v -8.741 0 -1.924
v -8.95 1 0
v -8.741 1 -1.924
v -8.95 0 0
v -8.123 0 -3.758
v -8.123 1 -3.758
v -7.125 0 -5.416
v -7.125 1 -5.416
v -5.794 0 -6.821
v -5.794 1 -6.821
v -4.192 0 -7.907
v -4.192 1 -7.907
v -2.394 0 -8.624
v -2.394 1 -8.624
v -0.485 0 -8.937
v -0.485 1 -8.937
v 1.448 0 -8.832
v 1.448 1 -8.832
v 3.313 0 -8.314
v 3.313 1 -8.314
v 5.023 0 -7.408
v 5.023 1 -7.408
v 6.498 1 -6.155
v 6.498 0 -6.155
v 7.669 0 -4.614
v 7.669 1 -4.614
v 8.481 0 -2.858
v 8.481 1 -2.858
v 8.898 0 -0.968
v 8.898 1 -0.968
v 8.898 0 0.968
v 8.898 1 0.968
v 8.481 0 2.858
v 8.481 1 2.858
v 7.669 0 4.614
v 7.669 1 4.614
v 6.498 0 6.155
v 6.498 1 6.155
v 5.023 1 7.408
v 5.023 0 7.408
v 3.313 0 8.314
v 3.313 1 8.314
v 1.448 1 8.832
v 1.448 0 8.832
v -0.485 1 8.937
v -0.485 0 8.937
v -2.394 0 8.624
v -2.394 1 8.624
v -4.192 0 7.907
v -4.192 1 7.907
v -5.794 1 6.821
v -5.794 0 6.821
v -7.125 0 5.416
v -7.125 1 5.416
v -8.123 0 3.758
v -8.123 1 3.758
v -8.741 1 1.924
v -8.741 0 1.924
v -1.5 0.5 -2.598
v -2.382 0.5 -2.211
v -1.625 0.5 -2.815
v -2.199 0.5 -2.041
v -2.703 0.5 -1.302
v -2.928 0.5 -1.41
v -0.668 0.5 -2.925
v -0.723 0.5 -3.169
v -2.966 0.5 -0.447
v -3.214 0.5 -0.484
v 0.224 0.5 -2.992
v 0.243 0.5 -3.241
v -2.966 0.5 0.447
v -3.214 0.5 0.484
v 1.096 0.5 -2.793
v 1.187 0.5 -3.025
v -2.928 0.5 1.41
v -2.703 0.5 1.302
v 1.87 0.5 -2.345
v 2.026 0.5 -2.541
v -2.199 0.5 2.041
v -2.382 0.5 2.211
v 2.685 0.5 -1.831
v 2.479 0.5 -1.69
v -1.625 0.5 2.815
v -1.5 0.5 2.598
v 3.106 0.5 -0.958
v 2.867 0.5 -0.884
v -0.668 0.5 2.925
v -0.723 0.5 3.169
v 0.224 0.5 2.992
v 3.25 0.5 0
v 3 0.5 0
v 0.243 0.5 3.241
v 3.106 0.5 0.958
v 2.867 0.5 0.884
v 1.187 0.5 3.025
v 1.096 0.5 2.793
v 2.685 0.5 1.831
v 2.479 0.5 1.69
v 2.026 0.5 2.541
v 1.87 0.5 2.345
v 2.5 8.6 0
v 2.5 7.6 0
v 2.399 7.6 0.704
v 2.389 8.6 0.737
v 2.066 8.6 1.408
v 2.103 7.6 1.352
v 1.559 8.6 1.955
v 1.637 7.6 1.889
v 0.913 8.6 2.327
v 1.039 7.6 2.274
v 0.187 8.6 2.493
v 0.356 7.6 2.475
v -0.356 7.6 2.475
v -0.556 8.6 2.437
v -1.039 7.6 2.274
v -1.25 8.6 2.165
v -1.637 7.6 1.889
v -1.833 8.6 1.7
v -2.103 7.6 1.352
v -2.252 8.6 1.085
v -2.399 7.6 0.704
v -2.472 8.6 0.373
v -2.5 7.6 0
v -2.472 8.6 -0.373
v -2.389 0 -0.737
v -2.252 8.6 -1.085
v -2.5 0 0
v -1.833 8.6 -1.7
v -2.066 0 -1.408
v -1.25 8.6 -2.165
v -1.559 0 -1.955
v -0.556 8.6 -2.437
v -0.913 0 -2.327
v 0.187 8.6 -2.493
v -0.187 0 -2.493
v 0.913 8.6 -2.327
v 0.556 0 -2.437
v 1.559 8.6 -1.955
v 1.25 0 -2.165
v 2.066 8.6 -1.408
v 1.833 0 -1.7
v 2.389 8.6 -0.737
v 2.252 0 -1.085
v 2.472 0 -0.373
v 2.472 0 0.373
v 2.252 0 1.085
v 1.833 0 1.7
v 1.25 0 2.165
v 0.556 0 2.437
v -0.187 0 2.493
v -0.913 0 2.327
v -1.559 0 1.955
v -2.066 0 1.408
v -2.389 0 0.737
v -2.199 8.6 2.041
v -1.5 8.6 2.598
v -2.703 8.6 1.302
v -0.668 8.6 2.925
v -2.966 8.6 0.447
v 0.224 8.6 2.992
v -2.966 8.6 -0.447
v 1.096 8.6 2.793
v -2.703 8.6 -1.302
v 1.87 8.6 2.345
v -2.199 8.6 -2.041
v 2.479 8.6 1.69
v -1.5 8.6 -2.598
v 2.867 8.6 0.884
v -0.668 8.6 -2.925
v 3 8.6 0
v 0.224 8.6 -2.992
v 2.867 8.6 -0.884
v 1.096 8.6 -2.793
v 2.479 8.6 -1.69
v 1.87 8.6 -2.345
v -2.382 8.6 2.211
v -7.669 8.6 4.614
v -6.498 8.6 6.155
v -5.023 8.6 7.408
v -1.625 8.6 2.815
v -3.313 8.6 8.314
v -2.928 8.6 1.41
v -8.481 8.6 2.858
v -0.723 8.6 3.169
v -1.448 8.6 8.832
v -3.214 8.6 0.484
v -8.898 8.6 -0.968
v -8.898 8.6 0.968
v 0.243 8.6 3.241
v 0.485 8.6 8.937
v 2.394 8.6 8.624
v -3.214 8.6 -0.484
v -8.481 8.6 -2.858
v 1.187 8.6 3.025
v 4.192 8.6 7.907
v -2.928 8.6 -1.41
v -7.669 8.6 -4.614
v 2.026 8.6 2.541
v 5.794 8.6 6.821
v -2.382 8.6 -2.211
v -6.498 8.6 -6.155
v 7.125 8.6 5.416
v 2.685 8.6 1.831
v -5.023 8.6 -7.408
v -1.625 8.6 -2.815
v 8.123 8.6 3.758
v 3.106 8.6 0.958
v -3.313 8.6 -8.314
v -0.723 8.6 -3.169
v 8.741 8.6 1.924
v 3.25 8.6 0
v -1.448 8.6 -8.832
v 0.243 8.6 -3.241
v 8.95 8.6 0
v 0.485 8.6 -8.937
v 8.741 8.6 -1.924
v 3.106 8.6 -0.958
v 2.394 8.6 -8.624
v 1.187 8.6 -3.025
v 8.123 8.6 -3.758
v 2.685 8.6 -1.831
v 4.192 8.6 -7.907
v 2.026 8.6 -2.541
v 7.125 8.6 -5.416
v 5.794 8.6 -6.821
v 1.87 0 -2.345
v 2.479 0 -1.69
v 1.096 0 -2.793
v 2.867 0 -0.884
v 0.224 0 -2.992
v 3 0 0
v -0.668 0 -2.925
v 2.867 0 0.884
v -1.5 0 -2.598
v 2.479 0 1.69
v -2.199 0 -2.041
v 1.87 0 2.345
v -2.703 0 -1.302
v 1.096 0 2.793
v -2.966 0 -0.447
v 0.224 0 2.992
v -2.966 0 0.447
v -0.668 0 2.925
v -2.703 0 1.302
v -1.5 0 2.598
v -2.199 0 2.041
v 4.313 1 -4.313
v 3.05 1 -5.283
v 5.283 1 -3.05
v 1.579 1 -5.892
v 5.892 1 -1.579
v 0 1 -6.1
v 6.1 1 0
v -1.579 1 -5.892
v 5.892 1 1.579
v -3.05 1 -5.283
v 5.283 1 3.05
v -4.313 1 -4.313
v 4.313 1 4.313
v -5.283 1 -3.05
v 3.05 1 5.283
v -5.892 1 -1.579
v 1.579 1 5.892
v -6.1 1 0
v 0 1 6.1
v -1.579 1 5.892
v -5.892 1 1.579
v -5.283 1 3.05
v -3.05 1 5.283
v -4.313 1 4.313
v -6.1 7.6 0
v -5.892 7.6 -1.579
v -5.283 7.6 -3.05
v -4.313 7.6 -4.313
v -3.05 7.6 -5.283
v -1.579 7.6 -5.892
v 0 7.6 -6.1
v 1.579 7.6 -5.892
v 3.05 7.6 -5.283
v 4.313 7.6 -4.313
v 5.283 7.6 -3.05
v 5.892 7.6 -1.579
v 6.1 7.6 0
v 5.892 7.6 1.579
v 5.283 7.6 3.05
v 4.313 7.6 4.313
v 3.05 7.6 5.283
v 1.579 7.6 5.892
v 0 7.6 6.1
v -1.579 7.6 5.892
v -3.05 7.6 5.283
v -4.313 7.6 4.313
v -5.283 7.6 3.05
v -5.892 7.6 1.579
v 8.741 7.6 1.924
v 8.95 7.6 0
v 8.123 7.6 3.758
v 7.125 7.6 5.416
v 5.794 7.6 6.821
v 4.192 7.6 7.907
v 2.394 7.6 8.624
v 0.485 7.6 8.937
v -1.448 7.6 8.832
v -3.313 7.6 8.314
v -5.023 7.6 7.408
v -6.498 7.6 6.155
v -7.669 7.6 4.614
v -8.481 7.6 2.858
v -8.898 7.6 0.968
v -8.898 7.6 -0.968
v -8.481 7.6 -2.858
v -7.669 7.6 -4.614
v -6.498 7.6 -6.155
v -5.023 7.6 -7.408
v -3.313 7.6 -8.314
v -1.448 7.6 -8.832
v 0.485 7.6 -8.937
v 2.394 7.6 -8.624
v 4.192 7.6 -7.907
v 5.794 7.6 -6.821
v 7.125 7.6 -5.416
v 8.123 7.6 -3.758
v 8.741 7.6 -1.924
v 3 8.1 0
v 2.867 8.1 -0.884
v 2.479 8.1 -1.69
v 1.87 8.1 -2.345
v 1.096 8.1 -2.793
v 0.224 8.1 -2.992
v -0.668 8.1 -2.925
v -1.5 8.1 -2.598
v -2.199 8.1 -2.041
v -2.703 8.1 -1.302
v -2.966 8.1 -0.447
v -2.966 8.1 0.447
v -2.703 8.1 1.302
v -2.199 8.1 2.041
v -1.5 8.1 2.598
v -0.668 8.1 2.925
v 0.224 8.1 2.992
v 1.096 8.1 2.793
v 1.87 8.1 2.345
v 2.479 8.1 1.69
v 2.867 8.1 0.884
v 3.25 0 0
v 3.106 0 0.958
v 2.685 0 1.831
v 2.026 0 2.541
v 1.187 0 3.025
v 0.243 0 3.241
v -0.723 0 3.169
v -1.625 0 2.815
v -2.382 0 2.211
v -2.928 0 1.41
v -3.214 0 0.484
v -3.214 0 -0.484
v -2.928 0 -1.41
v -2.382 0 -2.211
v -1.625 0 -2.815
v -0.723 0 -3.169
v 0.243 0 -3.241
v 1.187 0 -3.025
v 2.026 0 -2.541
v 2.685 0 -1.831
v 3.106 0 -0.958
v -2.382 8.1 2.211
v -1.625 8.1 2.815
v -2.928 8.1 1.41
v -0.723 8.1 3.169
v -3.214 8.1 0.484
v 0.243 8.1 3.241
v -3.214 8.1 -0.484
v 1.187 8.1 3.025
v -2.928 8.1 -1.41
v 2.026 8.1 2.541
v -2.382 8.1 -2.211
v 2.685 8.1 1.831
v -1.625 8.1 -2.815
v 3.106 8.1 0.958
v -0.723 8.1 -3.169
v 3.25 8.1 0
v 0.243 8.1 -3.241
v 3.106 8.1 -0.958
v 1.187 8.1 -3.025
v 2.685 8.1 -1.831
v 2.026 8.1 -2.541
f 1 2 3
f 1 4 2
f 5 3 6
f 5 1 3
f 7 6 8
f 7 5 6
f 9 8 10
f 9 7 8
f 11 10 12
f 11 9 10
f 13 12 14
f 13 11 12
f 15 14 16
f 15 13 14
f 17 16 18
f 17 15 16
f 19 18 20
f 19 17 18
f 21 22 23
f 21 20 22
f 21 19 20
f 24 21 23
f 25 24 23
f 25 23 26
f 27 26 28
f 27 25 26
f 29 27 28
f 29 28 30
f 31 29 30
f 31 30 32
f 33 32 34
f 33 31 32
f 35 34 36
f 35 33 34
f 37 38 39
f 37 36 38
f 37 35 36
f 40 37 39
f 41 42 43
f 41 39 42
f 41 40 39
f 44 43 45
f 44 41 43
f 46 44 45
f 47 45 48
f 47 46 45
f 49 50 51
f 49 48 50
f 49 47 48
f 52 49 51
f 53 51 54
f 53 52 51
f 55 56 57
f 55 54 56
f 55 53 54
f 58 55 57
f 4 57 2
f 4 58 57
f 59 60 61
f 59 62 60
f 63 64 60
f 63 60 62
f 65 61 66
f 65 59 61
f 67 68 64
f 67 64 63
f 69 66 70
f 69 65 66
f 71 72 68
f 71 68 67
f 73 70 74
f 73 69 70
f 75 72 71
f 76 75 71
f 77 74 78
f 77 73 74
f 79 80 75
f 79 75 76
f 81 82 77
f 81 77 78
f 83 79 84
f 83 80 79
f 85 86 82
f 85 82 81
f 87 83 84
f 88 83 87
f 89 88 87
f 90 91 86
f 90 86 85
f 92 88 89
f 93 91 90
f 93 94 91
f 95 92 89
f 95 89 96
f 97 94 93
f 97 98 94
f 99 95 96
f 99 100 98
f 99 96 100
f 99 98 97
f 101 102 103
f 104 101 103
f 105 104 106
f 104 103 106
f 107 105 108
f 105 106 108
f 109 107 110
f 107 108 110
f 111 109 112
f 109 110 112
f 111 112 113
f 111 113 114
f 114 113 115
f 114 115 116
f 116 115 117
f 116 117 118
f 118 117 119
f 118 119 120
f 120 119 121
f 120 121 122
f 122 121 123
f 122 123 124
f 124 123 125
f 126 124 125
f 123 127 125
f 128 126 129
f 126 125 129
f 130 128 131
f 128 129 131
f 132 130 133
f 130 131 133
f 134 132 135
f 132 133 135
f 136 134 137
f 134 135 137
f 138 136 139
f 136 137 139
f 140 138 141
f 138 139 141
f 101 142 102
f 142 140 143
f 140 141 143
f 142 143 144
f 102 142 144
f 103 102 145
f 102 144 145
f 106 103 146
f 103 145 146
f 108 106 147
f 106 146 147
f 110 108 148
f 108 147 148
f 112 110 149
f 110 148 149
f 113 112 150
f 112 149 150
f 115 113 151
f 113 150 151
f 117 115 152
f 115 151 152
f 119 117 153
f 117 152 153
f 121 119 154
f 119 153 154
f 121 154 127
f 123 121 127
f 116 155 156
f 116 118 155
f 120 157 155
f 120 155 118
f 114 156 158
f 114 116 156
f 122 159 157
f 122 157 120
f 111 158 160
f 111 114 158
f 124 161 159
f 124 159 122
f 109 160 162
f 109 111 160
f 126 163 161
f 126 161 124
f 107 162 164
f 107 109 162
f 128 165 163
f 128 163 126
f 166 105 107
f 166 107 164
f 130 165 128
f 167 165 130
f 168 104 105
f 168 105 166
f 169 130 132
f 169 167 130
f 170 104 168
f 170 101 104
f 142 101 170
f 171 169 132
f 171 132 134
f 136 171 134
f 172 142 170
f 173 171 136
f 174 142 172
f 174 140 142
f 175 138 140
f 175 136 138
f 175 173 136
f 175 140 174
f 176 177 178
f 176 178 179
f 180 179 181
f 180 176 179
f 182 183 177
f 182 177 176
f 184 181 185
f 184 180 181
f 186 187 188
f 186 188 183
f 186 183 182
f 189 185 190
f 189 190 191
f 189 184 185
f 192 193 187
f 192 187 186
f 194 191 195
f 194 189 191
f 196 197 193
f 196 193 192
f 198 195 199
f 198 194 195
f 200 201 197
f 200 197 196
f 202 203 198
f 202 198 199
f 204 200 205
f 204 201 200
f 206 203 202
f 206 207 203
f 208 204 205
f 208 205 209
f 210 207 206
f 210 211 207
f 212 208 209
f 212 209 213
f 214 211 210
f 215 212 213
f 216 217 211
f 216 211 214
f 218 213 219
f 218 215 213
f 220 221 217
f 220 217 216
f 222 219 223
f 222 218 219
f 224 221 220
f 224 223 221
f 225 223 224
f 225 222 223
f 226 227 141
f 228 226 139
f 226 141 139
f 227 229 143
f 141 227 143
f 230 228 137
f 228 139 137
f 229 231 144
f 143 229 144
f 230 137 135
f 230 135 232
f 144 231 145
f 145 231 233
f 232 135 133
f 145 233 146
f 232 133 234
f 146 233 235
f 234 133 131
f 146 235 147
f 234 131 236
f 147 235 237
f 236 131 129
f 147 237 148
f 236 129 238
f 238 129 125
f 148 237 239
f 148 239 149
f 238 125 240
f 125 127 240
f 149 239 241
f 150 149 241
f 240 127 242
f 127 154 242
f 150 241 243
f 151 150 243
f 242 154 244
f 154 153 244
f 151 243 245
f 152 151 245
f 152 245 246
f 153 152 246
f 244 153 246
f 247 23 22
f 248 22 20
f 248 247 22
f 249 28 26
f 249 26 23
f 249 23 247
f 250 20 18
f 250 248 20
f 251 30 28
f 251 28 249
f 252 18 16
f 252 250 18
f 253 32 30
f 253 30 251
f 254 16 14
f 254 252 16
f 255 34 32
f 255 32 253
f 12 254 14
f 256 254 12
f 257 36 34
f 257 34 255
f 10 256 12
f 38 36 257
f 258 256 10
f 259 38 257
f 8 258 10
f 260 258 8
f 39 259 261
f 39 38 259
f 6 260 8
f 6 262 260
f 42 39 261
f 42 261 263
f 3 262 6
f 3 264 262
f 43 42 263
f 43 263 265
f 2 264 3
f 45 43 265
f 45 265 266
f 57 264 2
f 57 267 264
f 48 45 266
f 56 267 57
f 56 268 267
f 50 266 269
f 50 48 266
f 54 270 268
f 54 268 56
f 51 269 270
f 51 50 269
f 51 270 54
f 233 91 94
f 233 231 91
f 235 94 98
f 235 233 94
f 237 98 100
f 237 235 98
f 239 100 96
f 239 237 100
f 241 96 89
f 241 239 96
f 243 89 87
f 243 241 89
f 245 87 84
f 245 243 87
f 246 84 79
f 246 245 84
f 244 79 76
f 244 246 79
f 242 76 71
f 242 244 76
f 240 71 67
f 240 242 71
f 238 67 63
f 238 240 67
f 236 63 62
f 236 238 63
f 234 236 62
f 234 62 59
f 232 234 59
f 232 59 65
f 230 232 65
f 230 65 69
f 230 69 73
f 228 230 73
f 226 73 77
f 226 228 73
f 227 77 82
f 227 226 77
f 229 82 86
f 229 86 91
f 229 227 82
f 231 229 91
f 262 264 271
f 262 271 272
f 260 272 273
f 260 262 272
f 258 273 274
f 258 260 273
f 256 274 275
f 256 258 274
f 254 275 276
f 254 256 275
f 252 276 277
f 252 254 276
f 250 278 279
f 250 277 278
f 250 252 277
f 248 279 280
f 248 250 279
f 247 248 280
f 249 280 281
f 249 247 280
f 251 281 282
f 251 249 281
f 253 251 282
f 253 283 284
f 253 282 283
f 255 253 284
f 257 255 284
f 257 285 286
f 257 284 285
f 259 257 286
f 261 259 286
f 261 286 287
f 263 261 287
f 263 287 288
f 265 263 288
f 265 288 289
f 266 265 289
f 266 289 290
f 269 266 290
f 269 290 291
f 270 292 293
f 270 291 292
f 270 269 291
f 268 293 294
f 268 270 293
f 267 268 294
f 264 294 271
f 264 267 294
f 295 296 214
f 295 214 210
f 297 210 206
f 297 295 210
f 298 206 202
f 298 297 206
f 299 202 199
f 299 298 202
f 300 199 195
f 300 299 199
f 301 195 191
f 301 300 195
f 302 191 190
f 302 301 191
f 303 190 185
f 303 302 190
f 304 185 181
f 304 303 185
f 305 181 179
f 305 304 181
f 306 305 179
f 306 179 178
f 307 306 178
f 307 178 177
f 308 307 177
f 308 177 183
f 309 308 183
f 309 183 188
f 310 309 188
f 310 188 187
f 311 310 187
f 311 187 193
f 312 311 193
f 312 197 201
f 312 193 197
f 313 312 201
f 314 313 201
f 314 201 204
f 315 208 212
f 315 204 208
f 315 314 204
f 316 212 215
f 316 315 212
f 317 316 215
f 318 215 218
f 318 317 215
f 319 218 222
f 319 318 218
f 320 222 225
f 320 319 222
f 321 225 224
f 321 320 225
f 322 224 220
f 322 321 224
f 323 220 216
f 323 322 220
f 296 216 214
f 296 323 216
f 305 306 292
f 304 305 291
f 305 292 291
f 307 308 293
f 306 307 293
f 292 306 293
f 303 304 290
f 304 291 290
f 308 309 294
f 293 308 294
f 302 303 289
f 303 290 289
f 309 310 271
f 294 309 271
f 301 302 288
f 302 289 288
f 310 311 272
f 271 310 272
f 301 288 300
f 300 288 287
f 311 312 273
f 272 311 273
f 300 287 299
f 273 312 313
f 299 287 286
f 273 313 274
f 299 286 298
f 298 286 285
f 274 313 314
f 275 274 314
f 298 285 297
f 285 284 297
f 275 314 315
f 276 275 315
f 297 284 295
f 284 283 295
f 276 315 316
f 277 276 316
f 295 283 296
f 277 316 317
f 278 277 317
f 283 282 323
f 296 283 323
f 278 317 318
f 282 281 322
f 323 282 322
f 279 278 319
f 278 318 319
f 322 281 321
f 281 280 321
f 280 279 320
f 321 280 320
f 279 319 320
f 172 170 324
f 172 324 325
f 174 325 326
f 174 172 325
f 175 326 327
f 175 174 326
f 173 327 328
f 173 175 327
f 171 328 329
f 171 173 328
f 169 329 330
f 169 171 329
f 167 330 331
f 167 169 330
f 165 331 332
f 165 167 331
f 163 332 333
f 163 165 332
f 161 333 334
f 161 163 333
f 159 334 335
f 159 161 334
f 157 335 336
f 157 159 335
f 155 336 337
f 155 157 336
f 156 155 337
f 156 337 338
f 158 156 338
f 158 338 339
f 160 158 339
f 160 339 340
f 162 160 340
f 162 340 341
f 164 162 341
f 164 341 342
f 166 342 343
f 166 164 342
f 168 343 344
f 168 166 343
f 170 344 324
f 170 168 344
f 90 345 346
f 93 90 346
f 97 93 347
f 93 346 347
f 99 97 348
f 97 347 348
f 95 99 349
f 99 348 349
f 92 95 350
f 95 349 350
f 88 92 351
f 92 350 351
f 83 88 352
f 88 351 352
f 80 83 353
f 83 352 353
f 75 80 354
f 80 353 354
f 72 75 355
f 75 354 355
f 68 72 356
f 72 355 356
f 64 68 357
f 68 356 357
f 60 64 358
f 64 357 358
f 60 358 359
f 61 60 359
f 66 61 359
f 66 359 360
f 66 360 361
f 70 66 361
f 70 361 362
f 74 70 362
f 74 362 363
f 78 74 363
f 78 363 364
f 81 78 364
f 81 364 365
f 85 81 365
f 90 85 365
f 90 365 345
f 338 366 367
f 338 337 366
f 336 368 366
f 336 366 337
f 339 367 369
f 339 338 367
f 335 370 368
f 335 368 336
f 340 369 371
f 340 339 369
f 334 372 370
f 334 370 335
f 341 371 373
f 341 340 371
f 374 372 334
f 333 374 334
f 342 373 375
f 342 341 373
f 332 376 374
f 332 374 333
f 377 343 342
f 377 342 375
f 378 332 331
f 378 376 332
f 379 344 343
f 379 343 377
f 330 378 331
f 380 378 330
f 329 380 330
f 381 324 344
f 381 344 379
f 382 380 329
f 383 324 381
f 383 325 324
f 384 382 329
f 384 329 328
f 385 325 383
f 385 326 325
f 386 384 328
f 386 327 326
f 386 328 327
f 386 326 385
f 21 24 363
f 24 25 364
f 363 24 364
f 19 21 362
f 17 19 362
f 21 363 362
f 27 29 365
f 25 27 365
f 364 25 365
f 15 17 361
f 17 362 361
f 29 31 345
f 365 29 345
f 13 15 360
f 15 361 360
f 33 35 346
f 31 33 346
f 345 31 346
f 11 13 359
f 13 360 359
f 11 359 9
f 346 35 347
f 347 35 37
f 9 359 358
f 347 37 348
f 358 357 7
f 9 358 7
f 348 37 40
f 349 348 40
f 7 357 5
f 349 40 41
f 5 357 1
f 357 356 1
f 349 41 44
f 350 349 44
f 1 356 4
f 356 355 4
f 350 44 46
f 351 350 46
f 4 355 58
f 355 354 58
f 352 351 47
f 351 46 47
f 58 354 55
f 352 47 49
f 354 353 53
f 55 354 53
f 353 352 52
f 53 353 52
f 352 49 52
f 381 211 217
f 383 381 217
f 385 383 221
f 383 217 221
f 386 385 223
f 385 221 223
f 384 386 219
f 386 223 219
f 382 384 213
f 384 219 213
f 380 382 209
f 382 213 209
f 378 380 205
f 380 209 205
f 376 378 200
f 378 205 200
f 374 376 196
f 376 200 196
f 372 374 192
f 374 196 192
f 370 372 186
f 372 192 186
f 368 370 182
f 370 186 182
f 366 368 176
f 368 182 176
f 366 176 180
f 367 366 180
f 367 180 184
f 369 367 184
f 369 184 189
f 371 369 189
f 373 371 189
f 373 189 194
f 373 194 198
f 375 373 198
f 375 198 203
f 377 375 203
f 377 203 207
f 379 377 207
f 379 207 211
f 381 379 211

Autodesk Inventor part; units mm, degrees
ref_plane "YZ Plane" through (0, 0, 0) normal (1, 0, 0) x (0, 1, 0)
ref_plane "XZ Plane" through (0, 0, 0) normal (0, 1, 0) x (-1, 0, 0)
ref_plane "XY Plane" through (0, 0, 0) normal (0, 0, 1) x (1, 0, 0)
sketch "Sketch1" plane through (0, 0, 0) normal (0, 1, 0) x (-1, 0, 0)
  circle A0 centre (0, 0) radius 2.5
  circle A1 centre (0, 0) radius 8.95
  circle A2 centre (0, 0) radius 6.1
  dimension "d0" = 5
  dimension "d1" = 17.9
  dimension "d2" = 12.2
extrude "Extrusion1" add sketch "Sketch1" along normal blind 1 contours A1 | A2
extrude "Extrusion2" add sketch "Sketch1" along normal blind 7.6 contours A2
sketch "Sketch2" plane through (0, 7.6, 0) normal (0, 1, 0) x (1, 0, 0)
  circle A0 centre (0, 0) radius 8.95 projected
  circle A1 centre (0, 0) radius 2.5
extrude "Extrusion3" add sketch "Sketch2" along normal blind 1
sketch "Sketch3" plane through (0, 0, 0) normal (0, -1, 0) x (1, 0, 0)
  circle A0 centre (0, 0) radius 3
  circle A1 centre (0, 0) radius 3.25
  dimension "d9" = 6
  dimension "d10" = 6.5
sketch "Sketch4" plane through (0, 8.6, 0) normal (0, 1, 0) x (1, 0, 0)
  circle A0 centre (0, 0) radius 3
  circle A1 centre (0, 0) radius 3.25
  dimension "d11" = 6
  dimension "d12" = 6.5
extrude "Extrusion4" cut sketch "Sketch4" against normal blind 0.5
extrude "Extrusion5" cut sketch "Sketch3" against normal blind 0.5
properties part number "Wheel"
